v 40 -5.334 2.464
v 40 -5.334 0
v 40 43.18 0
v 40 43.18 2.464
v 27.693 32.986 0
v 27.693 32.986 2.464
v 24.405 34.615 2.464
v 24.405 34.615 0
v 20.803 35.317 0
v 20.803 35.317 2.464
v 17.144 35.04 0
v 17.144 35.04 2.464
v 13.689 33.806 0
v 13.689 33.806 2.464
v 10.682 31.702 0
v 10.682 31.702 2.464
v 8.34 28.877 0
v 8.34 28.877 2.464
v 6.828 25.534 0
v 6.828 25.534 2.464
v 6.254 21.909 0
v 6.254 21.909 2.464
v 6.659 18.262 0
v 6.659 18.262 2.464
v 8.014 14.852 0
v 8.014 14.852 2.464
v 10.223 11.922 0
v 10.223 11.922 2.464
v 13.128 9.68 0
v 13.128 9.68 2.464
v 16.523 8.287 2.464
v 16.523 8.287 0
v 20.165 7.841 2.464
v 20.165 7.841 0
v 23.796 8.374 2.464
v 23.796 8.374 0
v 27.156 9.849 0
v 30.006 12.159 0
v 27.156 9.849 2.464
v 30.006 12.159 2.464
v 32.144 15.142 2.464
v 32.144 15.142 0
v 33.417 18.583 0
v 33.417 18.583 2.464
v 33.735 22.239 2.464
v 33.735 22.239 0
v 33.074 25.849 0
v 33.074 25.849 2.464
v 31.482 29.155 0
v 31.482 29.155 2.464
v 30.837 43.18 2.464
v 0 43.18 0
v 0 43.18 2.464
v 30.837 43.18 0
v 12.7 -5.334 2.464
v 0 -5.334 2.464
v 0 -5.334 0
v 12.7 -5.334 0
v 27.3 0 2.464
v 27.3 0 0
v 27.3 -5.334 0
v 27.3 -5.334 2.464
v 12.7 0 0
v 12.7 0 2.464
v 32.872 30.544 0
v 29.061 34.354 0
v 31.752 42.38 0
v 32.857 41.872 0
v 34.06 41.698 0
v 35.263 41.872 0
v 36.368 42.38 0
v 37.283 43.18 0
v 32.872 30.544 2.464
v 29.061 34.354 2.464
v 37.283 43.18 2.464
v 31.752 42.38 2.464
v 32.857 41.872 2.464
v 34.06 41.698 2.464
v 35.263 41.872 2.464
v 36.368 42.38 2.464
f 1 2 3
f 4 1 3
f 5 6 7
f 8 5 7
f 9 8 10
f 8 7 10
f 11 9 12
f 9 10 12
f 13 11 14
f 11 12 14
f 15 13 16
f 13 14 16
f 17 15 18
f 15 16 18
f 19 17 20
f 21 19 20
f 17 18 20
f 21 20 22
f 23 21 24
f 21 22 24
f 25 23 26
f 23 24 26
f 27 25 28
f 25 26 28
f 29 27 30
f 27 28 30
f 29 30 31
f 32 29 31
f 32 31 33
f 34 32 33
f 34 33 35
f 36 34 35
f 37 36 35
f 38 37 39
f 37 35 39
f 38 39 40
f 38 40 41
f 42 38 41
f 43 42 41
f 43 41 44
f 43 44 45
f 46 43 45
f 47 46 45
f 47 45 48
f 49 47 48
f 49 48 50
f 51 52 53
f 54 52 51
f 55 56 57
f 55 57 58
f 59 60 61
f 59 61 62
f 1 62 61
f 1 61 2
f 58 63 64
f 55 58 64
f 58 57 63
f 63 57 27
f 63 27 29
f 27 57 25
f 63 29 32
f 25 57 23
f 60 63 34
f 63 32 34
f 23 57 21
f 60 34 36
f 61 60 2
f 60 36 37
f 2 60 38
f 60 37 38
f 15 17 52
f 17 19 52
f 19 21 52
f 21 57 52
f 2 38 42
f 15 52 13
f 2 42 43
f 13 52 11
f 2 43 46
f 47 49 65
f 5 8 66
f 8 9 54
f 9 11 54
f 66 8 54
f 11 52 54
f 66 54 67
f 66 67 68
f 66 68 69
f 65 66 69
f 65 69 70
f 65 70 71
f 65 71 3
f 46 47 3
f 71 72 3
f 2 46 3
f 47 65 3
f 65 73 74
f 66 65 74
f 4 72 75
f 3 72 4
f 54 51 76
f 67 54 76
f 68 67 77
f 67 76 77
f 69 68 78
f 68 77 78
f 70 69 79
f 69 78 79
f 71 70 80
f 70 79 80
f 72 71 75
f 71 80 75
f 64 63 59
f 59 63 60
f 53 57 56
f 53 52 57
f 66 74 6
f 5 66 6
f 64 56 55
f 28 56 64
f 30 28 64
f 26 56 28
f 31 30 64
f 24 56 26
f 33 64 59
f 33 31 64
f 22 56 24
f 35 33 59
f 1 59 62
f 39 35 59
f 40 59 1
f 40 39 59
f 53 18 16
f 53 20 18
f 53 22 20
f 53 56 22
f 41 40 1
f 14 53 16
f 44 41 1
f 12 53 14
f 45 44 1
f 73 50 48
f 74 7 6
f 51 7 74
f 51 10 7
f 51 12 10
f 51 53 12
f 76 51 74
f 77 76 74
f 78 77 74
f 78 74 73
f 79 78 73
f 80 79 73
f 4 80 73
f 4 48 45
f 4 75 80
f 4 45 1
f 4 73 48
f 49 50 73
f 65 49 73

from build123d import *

# Parameters (mm, degrees)
SKETCH1_W          = 40
SKETCH1_H          = 43.18
BASE_DEPTH         = 2.4638
SKETCH2_W          = 12.7
SKETCH2_H          = 2.4638
BOTTOM_TABS_DEPTH  = 5.334
MOUNT_POINTS_DEPTH = 59.911651737
SKETCH6_R          = 4.245
CUT_EXTRUDE2_DEPTH = 66.894365141


with BuildPart() as part:
    # Sketch1 → Base (new body)
    with BuildSketch(Plane.XY):
        with Locations((20, 21.59)):
            Rectangle(SKETCH1_W, SKETCH1_H)
    extrude(amount=BASE_DEPTH)

    # Sketch2 → Bottom Tabs (add)
    with BuildSketch(Plane.XZ):
        with Locations((6.35, 1.2319)):
            Rectangle(SKETCH2_W, SKETCH2_H)
        with Locations((33.65, 1.2319)):
            Rectangle(SKETCH2_W, SKETCH2_H)
    extrude(amount=BOTTOM_TABS_DEPTH)

    # Sketch4 → Mount Points (cut, through all)
    with BuildSketch(Plane.XY.offset(2.4638)):
        with BuildLine():
            Line((31.481992586, 29.154809731), (32.871526584, 30.54434373))
            Line((32.871526584, 30.54434373), (29.061376273, 34.354494041))
            Line((29.061376273, 34.354494041), (27.693229207, 32.986346975))
            ThreePointArc((27.693229207, 32.986346975), (10.22286074, 11.922009108), (31.481992586, 29.154809731))
        make_face()
    extrude(amount=-MOUNT_POINTS_DEPTH, mode=Mode.SUBTRACT)

    # Sketch6 → Cut-Extrude2 (cut, through all)
    with BuildSketch(Plane(origin=(18.246403628, 22.293576812, 55.7276), x_dir=(1, 0, 0), z_dir=(0, 0, 1))):
        with Locations((15.813596372, 23.649057543)):
            Circle(SKETCH6_R)
    extrude(amount=-CUT_EXTRUDE2_DEPTH, mode=Mode.SUBTRACT)


solid = part.part
